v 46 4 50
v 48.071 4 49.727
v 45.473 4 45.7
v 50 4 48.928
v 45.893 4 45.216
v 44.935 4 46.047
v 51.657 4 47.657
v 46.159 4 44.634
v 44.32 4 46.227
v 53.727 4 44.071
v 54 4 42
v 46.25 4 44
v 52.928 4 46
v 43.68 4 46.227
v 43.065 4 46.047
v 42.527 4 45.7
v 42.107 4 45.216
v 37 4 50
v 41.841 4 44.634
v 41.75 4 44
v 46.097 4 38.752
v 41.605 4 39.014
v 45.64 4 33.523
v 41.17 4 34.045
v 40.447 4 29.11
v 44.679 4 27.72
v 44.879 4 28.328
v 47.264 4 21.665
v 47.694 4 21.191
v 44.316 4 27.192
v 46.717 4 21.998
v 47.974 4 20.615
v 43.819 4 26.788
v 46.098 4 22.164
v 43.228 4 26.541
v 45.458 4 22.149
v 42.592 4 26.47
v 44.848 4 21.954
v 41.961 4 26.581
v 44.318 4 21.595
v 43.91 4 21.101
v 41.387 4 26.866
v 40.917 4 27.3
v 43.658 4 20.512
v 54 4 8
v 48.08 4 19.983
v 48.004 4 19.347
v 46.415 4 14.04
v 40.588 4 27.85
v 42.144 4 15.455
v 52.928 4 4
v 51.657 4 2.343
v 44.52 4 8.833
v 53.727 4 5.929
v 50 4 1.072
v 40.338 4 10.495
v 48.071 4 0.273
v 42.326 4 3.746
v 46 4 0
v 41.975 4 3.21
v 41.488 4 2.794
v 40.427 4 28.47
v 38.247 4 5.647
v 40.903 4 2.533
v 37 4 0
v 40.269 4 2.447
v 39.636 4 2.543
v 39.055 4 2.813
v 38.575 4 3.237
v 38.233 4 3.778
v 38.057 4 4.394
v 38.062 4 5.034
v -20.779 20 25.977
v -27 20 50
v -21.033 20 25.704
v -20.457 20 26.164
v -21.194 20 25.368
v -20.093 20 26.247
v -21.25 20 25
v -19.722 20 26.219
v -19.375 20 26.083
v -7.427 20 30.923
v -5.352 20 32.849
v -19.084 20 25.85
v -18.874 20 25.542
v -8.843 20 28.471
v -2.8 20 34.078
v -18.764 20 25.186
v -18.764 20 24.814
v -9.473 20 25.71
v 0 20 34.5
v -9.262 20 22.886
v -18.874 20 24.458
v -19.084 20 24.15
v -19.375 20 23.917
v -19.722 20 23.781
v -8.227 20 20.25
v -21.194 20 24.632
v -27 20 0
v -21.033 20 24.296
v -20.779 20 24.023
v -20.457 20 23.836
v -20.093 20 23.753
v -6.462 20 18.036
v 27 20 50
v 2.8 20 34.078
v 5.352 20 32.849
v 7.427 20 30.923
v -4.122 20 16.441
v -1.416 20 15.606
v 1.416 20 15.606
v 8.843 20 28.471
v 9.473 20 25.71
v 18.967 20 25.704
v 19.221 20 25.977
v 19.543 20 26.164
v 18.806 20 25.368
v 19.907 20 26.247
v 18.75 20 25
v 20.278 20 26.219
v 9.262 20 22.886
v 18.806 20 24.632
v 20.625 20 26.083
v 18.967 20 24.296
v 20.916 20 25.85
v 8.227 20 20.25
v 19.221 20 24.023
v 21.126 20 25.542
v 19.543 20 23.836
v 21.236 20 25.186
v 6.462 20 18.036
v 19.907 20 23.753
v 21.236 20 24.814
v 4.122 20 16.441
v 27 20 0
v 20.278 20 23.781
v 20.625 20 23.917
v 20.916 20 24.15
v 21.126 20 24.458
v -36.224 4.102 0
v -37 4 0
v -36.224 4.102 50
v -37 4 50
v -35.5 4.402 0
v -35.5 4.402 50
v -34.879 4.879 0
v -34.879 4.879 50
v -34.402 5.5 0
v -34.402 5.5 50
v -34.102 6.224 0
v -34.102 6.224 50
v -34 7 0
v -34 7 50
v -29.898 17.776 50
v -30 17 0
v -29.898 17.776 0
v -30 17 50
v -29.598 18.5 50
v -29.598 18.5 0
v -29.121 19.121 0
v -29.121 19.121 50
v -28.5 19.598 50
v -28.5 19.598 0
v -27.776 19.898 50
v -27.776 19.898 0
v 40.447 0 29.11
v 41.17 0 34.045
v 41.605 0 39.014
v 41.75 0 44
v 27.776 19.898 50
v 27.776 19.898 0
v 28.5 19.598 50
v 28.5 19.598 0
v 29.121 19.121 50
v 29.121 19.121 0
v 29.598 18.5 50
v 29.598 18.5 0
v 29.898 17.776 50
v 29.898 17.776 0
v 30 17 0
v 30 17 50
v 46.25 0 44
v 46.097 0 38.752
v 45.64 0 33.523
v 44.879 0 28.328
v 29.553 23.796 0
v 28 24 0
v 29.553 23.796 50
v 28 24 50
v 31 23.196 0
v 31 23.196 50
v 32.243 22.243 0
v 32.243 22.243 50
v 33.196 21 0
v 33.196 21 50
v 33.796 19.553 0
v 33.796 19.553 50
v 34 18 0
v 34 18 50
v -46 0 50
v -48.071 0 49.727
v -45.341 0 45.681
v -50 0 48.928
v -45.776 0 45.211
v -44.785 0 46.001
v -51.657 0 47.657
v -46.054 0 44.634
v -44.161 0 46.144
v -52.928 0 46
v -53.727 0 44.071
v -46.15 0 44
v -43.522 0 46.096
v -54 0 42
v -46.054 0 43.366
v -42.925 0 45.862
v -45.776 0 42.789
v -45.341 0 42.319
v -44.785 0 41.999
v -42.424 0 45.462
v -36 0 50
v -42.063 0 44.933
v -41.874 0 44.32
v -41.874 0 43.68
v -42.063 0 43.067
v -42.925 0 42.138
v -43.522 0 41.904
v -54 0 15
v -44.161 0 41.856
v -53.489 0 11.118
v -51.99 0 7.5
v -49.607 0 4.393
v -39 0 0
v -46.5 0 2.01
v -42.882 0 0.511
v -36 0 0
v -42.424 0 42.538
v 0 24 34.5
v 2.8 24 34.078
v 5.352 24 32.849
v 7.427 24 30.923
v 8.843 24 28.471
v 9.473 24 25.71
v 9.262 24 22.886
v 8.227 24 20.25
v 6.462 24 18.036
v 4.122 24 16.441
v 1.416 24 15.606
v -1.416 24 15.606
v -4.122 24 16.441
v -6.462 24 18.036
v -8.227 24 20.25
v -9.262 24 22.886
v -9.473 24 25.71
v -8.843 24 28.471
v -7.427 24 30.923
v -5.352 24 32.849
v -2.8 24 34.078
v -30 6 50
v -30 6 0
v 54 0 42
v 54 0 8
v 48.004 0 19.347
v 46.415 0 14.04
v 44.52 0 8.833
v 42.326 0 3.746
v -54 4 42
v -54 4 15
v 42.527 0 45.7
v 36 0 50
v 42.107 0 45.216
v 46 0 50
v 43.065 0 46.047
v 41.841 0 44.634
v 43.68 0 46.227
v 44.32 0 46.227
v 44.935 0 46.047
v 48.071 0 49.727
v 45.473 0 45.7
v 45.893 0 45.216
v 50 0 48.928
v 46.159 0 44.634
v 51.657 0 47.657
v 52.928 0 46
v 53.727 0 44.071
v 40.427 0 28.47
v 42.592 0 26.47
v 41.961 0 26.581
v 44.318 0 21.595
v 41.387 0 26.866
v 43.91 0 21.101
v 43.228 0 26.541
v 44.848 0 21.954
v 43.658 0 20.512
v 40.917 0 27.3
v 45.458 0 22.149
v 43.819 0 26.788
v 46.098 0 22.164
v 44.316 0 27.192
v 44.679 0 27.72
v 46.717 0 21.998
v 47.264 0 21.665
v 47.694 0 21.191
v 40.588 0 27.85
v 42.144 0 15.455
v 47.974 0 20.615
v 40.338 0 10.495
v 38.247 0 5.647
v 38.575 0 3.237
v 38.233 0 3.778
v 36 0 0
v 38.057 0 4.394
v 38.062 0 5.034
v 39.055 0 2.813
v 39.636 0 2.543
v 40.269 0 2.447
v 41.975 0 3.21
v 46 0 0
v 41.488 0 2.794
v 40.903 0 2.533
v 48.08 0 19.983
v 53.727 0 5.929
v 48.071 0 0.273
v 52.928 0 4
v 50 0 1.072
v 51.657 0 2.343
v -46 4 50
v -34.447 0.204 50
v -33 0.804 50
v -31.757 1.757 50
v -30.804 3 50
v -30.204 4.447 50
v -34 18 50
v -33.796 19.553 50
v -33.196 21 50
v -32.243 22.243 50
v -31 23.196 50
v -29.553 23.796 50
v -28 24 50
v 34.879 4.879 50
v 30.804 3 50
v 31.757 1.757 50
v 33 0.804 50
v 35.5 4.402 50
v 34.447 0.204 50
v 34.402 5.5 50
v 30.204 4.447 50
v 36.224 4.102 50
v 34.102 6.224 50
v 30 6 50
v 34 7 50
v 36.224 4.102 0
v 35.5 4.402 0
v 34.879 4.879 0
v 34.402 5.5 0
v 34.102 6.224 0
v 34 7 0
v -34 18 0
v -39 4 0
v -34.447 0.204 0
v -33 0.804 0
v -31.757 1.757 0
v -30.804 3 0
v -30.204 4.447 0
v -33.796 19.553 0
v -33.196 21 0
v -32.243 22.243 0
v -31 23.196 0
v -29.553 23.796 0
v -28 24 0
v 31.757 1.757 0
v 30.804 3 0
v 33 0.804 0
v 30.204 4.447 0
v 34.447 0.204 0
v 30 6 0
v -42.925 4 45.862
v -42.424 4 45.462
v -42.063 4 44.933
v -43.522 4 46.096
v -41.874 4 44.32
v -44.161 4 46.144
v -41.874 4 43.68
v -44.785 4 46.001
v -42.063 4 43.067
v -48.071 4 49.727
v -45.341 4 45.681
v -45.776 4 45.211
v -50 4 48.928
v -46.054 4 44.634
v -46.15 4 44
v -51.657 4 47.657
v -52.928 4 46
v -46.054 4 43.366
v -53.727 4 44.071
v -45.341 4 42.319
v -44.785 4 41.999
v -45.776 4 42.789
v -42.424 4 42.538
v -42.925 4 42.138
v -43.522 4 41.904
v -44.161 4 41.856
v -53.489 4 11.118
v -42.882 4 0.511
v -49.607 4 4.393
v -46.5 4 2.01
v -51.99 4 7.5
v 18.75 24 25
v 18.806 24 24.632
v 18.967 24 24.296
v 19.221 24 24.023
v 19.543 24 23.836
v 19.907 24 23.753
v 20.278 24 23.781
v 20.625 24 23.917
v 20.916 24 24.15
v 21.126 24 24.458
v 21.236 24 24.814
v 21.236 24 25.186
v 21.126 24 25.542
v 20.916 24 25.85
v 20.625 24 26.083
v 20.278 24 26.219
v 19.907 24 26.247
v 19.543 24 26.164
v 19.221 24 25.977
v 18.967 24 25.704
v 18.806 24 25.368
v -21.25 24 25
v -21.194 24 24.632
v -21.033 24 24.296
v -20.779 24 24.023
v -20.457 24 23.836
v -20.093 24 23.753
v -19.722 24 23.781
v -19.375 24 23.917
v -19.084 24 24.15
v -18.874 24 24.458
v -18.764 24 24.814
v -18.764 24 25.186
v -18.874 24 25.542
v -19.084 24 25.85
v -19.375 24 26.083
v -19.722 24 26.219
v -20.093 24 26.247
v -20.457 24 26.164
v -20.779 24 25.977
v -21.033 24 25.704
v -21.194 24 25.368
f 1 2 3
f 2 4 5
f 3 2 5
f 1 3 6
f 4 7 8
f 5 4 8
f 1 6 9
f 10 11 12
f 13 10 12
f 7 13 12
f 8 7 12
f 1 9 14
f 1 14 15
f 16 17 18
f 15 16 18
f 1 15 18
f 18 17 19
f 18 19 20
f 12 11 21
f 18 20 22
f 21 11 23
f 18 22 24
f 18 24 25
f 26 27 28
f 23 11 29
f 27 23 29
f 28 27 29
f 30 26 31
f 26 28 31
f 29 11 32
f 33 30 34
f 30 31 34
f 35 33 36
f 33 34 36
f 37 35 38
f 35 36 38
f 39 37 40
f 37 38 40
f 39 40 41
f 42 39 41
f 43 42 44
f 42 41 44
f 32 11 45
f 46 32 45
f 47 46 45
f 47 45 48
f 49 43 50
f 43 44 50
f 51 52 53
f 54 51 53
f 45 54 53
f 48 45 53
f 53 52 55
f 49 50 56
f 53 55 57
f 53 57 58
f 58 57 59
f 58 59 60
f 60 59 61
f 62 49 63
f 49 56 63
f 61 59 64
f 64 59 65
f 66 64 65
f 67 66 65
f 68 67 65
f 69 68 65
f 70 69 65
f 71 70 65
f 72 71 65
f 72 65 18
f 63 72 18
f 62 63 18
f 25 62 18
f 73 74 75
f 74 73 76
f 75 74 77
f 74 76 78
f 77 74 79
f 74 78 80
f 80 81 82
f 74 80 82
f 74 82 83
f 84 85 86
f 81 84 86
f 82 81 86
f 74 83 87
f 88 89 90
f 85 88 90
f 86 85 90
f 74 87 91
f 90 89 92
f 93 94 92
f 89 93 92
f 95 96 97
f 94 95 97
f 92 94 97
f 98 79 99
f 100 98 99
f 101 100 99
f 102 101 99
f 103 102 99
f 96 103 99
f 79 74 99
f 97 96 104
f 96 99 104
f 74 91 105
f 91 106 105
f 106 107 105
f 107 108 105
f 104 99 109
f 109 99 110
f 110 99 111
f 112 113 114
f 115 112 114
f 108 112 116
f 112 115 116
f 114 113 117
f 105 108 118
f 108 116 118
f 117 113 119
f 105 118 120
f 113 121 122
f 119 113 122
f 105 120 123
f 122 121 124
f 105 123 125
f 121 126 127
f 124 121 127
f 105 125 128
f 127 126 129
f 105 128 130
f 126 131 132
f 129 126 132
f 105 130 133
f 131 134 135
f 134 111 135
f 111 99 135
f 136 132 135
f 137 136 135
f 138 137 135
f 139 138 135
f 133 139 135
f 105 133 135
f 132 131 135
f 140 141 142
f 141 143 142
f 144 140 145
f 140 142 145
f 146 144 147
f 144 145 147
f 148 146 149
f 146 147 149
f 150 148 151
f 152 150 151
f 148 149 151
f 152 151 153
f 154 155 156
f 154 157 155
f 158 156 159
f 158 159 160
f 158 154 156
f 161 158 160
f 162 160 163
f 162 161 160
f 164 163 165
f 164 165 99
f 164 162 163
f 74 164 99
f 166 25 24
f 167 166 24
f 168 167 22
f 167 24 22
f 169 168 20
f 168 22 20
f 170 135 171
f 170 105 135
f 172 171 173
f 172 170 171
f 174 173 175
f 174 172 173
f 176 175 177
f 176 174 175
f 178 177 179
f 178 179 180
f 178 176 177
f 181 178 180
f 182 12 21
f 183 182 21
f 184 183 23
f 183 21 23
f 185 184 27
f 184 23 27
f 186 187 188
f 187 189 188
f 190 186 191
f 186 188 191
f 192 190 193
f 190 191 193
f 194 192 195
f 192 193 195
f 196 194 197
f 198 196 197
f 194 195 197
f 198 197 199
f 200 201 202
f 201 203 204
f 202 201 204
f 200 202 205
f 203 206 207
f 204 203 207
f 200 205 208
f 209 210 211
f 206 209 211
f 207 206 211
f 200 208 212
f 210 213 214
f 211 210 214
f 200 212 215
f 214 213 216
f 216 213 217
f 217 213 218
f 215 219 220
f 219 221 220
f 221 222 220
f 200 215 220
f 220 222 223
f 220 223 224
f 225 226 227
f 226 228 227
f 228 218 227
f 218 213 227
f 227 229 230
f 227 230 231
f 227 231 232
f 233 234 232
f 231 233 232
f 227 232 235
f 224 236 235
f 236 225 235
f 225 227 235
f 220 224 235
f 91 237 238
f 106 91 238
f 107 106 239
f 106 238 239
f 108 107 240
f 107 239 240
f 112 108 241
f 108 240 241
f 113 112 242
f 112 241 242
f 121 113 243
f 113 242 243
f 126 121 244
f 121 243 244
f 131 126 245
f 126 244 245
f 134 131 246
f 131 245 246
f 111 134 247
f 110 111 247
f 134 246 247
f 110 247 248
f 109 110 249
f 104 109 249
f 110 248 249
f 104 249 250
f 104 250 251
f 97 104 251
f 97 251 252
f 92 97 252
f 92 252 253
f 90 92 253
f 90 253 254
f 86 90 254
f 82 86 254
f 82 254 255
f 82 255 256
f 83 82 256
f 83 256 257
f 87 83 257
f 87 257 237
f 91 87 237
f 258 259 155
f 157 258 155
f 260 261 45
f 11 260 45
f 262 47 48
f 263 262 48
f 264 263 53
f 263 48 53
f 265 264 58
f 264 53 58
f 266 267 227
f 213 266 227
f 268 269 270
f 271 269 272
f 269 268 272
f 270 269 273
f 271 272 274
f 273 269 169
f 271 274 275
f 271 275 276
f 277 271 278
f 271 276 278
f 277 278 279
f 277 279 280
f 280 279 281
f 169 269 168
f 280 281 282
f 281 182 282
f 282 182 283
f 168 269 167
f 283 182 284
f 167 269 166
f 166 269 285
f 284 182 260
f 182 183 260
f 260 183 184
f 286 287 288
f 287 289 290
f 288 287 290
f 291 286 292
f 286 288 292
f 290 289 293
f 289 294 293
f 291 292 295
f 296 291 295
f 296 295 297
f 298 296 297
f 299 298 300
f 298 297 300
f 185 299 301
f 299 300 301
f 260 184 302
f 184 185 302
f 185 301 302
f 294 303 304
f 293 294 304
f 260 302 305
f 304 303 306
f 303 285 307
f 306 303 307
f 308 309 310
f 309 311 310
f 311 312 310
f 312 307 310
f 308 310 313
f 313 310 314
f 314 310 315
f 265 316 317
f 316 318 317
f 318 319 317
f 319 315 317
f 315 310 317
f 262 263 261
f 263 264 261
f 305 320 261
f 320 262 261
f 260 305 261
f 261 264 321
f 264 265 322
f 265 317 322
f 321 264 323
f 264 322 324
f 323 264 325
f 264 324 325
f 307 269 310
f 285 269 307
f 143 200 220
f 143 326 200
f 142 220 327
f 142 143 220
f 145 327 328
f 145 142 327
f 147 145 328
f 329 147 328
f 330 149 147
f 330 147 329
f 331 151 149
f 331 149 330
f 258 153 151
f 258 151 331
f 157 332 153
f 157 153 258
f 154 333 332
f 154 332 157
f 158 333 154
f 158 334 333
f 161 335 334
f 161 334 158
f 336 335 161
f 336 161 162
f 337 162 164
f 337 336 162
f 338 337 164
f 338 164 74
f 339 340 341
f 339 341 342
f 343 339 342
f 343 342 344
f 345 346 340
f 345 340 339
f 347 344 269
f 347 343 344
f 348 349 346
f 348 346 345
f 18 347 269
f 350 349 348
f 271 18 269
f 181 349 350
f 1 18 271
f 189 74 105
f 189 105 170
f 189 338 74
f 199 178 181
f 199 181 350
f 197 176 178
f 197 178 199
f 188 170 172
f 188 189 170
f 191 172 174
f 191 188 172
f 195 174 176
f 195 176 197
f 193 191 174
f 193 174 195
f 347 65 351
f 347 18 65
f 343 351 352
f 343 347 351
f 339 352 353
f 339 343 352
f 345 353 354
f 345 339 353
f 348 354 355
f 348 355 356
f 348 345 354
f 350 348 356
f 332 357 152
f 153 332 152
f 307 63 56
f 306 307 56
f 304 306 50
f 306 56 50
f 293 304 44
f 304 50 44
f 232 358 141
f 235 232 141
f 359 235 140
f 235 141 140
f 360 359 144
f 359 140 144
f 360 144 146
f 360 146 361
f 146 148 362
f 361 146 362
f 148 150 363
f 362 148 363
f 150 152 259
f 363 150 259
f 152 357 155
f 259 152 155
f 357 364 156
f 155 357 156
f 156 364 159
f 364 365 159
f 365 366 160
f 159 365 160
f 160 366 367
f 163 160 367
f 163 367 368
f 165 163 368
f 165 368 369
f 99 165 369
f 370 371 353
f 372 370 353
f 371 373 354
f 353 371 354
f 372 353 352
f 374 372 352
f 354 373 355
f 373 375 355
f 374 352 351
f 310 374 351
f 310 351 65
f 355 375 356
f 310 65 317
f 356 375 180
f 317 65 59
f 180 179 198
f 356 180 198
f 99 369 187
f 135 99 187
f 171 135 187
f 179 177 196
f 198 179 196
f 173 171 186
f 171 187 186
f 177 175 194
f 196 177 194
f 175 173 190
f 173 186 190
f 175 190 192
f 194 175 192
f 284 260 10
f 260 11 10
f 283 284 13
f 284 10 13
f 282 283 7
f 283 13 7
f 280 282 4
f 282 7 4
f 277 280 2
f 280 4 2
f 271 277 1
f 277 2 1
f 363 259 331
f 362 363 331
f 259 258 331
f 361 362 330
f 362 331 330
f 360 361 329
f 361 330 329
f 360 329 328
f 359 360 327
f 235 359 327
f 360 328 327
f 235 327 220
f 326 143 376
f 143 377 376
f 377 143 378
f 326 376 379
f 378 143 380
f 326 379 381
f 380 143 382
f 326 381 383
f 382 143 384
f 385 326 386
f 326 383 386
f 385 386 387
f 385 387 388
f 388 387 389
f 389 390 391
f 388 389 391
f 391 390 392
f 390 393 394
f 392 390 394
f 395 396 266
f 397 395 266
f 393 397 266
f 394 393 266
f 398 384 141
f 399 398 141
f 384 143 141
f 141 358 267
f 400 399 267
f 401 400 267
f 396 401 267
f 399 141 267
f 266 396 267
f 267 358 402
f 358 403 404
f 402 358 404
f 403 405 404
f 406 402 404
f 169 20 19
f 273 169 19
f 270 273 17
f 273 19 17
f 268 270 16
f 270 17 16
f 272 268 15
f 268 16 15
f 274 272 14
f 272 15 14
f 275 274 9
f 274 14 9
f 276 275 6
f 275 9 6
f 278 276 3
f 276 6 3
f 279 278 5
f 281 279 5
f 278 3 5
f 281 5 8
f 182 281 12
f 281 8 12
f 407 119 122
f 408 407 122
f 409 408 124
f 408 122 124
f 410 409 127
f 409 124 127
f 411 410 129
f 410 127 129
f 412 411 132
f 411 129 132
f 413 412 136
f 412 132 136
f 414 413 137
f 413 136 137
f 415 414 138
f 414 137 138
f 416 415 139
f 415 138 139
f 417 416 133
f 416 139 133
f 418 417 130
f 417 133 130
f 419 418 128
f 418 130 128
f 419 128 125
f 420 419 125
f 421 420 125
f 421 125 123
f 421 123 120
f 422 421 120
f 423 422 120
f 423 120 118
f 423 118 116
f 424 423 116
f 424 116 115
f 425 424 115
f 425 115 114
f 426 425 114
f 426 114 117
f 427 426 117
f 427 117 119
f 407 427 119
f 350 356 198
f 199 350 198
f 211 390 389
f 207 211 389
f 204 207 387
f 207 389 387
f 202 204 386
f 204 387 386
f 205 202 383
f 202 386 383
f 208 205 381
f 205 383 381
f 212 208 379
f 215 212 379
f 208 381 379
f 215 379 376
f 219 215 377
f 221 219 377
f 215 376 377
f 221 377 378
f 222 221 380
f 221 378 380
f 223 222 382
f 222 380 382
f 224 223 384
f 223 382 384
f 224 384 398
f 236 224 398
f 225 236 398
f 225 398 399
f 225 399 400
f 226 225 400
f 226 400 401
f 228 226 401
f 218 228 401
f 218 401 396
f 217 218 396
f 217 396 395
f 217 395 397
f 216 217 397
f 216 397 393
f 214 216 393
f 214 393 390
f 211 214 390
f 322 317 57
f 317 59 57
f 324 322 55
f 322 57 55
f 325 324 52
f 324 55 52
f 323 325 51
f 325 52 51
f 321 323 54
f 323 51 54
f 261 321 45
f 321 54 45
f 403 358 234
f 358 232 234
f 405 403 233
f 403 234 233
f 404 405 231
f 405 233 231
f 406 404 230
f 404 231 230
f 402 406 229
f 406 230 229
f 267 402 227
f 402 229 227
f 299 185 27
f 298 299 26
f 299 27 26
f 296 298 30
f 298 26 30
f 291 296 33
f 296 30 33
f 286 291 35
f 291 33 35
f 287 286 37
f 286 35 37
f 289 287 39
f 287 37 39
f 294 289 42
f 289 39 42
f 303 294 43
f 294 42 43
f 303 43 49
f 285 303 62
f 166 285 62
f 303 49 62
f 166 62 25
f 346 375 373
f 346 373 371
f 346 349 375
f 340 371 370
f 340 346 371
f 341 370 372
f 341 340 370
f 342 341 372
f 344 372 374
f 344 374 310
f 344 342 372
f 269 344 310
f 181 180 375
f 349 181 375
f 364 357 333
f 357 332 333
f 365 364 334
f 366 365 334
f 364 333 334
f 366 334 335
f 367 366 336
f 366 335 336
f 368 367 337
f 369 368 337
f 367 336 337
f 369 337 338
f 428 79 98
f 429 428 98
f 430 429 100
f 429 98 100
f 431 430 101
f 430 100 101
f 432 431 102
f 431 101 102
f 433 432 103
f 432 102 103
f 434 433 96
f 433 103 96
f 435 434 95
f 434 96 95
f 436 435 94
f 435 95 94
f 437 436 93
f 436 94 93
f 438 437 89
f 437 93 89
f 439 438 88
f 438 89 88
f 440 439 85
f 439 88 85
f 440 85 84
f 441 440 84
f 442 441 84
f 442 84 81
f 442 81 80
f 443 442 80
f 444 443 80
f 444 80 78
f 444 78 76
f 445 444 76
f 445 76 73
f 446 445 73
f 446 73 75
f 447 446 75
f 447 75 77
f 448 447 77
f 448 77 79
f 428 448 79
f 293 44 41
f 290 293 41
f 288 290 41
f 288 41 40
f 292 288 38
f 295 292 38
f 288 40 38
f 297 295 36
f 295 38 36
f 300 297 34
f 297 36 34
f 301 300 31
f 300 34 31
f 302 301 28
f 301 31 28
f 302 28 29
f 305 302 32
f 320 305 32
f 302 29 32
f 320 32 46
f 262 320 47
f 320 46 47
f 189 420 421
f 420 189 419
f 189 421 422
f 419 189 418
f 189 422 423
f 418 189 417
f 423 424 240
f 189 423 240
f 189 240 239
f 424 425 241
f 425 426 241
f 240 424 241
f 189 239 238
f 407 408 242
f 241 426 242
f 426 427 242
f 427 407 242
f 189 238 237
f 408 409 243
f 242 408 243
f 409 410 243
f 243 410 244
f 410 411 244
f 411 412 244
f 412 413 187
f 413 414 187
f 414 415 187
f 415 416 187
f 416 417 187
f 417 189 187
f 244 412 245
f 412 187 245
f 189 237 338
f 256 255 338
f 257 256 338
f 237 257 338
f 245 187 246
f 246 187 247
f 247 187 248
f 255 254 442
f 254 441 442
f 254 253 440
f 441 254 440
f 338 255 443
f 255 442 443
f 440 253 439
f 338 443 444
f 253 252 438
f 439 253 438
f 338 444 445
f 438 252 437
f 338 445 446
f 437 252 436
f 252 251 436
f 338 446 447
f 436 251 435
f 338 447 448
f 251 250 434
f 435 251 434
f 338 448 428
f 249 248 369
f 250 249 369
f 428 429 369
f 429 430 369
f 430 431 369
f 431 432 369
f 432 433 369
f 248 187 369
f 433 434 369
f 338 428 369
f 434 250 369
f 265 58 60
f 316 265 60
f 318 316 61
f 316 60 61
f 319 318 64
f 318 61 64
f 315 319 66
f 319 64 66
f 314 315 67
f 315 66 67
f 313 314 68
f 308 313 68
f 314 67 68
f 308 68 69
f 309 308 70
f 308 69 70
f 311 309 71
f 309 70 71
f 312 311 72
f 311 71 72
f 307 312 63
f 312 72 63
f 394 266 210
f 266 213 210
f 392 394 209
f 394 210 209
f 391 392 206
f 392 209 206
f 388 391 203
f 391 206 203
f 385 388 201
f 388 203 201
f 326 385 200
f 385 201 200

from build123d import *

# Parameters (mm, degrees)
BOSS_EXTRUDE1_DEPTH = 50
SKETCH2_R           = 9.5
CUT_EXTRUDE1_DEPTH  = 10
M3_TAPPED_HOLE1_D   = 2.5
SKETCH7_R           = 2.15
CUT_EXTRUDE2_DEPTH  = 10
FILLET1_R           = 3
FILLET2_R           = 6
FILLET3_R           = 15
FILLET4_R           = 8


with BuildPart() as part:
    # Sketch1 → Boss-Extrude1 (new body)
    with BuildSketch(Plane.XY):
        Polygon((-54, 0), (-30, 0), (-30, 20), (30, 20), (30, 0), (54, 0), (54, 4), (34, 4), (34, 24), (-34, 24), (-34, 4), (-54, 4), align=None)
    extrude(amount=BOSS_EXTRUDE1_DEPTH)

    # Sketch2 → Cut-Extrude1 (cut)
    with BuildSketch(Plane(origin=(0, 24, 0), x_dir=(1, 0, 0), z_dir=(0, 1, 0))):
        with Locations((0, -25)):
            Circle(SKETCH2_R)
    extrude(amount=-CUT_EXTRUDE1_DEPTH, mode=Mode.SUBTRACT)

    # M3 Tapped Hole1 (through all)
    with Locations(Plane(origin=(0, 24, 0), x_dir=(1, 0, 0), z_dir=(0, 1, 0))):
        with Locations((20, -25), (-20, -25)):
            Hole(M3_TAPPED_HOLE1_D / 2)

    # Sketch7 → Cut-Extrude2 (cut)
    with BuildSketch(Plane(origin=(0, 4, 0), x_dir=(1, 0, 0), z_dir=(0, 1, 0))):
        with Locations((-44, -44)):
            Circle(SKETCH7_R)
        with BuildLine():
            ThreePointArc((46.25, -44), (45.906571503, -36.134194217), (44.878899709, -28.328251966))
            ThreePointArc((44.878899709, -28.328251966), (42.272373865, -26.503142921), (40.447264821, -29.109668765))
            ThreePointArc((40.447264821, -29.109668765), (41.423695361, -36.526395059), (41.75, -44))
            ThreePointArc((41.75, -44), (44, -46.25), (46.25, -44))
        make_face()
        with BuildLine():
            ThreePointArc((48.004434954, -19.347485954), (45.50572213, -11.422581348), (42.325816715, -3.745610569))
            ThreePointArc((42.325816715, -3.745610569), (39.335733105, -2.657309137), (38.247431674, -5.647392747))
            ThreePointArc((38.247431674, -5.647392747), (41.277105336, -12.961671993), (43.657768736, -20.512171657))
            ThreePointArc((43.657768736, -20.512171657), (46.413444696, -22.103161915), (48.004434954, -19.347485954))
        make_face()
    extrude(amount=-CUT_EXTRUDE2_DEPTH, mode=Mode.SUBTRACT)

    # Fillet1
    fillet1_edges = [part.edges().sort_by_distance(p)[0] for p in [
        (34, 4, 25),
        (30, 20, 25),
        (-30, 20, 25),
        (-34, 4, 25),
    ]]
    fillet(fillet1_edges, radius=FILLET1_R)

    # Fillet2
    fillet2_edges = [part.edges().sort_by_distance(p)[0] for p in [
        (30, 0, 25),
        (34, 24, 25),
        (-30, 0, 25),
        (-34, 24, 25),
    ]]
    fillet(fillet2_edges, radius=FILLET2_R)

    # Fillet3
    fillet3_edges = [part.edges().sort_by_distance(p)[0] for p in [
        (-54, 2, 0),
    ]]
    fillet(fillet3_edges, radius=FILLET3_R)

    # Fillet4
    fillet4_edges = [part.edges().sort_by_distance(p)[0] for p in [
        (-54, 2, 50),
        (54, 2, 50),
        (54, 2, 0),
    ]]
    fillet(fillet4_edges, radius=FILLET4_R)


solid = part.part
